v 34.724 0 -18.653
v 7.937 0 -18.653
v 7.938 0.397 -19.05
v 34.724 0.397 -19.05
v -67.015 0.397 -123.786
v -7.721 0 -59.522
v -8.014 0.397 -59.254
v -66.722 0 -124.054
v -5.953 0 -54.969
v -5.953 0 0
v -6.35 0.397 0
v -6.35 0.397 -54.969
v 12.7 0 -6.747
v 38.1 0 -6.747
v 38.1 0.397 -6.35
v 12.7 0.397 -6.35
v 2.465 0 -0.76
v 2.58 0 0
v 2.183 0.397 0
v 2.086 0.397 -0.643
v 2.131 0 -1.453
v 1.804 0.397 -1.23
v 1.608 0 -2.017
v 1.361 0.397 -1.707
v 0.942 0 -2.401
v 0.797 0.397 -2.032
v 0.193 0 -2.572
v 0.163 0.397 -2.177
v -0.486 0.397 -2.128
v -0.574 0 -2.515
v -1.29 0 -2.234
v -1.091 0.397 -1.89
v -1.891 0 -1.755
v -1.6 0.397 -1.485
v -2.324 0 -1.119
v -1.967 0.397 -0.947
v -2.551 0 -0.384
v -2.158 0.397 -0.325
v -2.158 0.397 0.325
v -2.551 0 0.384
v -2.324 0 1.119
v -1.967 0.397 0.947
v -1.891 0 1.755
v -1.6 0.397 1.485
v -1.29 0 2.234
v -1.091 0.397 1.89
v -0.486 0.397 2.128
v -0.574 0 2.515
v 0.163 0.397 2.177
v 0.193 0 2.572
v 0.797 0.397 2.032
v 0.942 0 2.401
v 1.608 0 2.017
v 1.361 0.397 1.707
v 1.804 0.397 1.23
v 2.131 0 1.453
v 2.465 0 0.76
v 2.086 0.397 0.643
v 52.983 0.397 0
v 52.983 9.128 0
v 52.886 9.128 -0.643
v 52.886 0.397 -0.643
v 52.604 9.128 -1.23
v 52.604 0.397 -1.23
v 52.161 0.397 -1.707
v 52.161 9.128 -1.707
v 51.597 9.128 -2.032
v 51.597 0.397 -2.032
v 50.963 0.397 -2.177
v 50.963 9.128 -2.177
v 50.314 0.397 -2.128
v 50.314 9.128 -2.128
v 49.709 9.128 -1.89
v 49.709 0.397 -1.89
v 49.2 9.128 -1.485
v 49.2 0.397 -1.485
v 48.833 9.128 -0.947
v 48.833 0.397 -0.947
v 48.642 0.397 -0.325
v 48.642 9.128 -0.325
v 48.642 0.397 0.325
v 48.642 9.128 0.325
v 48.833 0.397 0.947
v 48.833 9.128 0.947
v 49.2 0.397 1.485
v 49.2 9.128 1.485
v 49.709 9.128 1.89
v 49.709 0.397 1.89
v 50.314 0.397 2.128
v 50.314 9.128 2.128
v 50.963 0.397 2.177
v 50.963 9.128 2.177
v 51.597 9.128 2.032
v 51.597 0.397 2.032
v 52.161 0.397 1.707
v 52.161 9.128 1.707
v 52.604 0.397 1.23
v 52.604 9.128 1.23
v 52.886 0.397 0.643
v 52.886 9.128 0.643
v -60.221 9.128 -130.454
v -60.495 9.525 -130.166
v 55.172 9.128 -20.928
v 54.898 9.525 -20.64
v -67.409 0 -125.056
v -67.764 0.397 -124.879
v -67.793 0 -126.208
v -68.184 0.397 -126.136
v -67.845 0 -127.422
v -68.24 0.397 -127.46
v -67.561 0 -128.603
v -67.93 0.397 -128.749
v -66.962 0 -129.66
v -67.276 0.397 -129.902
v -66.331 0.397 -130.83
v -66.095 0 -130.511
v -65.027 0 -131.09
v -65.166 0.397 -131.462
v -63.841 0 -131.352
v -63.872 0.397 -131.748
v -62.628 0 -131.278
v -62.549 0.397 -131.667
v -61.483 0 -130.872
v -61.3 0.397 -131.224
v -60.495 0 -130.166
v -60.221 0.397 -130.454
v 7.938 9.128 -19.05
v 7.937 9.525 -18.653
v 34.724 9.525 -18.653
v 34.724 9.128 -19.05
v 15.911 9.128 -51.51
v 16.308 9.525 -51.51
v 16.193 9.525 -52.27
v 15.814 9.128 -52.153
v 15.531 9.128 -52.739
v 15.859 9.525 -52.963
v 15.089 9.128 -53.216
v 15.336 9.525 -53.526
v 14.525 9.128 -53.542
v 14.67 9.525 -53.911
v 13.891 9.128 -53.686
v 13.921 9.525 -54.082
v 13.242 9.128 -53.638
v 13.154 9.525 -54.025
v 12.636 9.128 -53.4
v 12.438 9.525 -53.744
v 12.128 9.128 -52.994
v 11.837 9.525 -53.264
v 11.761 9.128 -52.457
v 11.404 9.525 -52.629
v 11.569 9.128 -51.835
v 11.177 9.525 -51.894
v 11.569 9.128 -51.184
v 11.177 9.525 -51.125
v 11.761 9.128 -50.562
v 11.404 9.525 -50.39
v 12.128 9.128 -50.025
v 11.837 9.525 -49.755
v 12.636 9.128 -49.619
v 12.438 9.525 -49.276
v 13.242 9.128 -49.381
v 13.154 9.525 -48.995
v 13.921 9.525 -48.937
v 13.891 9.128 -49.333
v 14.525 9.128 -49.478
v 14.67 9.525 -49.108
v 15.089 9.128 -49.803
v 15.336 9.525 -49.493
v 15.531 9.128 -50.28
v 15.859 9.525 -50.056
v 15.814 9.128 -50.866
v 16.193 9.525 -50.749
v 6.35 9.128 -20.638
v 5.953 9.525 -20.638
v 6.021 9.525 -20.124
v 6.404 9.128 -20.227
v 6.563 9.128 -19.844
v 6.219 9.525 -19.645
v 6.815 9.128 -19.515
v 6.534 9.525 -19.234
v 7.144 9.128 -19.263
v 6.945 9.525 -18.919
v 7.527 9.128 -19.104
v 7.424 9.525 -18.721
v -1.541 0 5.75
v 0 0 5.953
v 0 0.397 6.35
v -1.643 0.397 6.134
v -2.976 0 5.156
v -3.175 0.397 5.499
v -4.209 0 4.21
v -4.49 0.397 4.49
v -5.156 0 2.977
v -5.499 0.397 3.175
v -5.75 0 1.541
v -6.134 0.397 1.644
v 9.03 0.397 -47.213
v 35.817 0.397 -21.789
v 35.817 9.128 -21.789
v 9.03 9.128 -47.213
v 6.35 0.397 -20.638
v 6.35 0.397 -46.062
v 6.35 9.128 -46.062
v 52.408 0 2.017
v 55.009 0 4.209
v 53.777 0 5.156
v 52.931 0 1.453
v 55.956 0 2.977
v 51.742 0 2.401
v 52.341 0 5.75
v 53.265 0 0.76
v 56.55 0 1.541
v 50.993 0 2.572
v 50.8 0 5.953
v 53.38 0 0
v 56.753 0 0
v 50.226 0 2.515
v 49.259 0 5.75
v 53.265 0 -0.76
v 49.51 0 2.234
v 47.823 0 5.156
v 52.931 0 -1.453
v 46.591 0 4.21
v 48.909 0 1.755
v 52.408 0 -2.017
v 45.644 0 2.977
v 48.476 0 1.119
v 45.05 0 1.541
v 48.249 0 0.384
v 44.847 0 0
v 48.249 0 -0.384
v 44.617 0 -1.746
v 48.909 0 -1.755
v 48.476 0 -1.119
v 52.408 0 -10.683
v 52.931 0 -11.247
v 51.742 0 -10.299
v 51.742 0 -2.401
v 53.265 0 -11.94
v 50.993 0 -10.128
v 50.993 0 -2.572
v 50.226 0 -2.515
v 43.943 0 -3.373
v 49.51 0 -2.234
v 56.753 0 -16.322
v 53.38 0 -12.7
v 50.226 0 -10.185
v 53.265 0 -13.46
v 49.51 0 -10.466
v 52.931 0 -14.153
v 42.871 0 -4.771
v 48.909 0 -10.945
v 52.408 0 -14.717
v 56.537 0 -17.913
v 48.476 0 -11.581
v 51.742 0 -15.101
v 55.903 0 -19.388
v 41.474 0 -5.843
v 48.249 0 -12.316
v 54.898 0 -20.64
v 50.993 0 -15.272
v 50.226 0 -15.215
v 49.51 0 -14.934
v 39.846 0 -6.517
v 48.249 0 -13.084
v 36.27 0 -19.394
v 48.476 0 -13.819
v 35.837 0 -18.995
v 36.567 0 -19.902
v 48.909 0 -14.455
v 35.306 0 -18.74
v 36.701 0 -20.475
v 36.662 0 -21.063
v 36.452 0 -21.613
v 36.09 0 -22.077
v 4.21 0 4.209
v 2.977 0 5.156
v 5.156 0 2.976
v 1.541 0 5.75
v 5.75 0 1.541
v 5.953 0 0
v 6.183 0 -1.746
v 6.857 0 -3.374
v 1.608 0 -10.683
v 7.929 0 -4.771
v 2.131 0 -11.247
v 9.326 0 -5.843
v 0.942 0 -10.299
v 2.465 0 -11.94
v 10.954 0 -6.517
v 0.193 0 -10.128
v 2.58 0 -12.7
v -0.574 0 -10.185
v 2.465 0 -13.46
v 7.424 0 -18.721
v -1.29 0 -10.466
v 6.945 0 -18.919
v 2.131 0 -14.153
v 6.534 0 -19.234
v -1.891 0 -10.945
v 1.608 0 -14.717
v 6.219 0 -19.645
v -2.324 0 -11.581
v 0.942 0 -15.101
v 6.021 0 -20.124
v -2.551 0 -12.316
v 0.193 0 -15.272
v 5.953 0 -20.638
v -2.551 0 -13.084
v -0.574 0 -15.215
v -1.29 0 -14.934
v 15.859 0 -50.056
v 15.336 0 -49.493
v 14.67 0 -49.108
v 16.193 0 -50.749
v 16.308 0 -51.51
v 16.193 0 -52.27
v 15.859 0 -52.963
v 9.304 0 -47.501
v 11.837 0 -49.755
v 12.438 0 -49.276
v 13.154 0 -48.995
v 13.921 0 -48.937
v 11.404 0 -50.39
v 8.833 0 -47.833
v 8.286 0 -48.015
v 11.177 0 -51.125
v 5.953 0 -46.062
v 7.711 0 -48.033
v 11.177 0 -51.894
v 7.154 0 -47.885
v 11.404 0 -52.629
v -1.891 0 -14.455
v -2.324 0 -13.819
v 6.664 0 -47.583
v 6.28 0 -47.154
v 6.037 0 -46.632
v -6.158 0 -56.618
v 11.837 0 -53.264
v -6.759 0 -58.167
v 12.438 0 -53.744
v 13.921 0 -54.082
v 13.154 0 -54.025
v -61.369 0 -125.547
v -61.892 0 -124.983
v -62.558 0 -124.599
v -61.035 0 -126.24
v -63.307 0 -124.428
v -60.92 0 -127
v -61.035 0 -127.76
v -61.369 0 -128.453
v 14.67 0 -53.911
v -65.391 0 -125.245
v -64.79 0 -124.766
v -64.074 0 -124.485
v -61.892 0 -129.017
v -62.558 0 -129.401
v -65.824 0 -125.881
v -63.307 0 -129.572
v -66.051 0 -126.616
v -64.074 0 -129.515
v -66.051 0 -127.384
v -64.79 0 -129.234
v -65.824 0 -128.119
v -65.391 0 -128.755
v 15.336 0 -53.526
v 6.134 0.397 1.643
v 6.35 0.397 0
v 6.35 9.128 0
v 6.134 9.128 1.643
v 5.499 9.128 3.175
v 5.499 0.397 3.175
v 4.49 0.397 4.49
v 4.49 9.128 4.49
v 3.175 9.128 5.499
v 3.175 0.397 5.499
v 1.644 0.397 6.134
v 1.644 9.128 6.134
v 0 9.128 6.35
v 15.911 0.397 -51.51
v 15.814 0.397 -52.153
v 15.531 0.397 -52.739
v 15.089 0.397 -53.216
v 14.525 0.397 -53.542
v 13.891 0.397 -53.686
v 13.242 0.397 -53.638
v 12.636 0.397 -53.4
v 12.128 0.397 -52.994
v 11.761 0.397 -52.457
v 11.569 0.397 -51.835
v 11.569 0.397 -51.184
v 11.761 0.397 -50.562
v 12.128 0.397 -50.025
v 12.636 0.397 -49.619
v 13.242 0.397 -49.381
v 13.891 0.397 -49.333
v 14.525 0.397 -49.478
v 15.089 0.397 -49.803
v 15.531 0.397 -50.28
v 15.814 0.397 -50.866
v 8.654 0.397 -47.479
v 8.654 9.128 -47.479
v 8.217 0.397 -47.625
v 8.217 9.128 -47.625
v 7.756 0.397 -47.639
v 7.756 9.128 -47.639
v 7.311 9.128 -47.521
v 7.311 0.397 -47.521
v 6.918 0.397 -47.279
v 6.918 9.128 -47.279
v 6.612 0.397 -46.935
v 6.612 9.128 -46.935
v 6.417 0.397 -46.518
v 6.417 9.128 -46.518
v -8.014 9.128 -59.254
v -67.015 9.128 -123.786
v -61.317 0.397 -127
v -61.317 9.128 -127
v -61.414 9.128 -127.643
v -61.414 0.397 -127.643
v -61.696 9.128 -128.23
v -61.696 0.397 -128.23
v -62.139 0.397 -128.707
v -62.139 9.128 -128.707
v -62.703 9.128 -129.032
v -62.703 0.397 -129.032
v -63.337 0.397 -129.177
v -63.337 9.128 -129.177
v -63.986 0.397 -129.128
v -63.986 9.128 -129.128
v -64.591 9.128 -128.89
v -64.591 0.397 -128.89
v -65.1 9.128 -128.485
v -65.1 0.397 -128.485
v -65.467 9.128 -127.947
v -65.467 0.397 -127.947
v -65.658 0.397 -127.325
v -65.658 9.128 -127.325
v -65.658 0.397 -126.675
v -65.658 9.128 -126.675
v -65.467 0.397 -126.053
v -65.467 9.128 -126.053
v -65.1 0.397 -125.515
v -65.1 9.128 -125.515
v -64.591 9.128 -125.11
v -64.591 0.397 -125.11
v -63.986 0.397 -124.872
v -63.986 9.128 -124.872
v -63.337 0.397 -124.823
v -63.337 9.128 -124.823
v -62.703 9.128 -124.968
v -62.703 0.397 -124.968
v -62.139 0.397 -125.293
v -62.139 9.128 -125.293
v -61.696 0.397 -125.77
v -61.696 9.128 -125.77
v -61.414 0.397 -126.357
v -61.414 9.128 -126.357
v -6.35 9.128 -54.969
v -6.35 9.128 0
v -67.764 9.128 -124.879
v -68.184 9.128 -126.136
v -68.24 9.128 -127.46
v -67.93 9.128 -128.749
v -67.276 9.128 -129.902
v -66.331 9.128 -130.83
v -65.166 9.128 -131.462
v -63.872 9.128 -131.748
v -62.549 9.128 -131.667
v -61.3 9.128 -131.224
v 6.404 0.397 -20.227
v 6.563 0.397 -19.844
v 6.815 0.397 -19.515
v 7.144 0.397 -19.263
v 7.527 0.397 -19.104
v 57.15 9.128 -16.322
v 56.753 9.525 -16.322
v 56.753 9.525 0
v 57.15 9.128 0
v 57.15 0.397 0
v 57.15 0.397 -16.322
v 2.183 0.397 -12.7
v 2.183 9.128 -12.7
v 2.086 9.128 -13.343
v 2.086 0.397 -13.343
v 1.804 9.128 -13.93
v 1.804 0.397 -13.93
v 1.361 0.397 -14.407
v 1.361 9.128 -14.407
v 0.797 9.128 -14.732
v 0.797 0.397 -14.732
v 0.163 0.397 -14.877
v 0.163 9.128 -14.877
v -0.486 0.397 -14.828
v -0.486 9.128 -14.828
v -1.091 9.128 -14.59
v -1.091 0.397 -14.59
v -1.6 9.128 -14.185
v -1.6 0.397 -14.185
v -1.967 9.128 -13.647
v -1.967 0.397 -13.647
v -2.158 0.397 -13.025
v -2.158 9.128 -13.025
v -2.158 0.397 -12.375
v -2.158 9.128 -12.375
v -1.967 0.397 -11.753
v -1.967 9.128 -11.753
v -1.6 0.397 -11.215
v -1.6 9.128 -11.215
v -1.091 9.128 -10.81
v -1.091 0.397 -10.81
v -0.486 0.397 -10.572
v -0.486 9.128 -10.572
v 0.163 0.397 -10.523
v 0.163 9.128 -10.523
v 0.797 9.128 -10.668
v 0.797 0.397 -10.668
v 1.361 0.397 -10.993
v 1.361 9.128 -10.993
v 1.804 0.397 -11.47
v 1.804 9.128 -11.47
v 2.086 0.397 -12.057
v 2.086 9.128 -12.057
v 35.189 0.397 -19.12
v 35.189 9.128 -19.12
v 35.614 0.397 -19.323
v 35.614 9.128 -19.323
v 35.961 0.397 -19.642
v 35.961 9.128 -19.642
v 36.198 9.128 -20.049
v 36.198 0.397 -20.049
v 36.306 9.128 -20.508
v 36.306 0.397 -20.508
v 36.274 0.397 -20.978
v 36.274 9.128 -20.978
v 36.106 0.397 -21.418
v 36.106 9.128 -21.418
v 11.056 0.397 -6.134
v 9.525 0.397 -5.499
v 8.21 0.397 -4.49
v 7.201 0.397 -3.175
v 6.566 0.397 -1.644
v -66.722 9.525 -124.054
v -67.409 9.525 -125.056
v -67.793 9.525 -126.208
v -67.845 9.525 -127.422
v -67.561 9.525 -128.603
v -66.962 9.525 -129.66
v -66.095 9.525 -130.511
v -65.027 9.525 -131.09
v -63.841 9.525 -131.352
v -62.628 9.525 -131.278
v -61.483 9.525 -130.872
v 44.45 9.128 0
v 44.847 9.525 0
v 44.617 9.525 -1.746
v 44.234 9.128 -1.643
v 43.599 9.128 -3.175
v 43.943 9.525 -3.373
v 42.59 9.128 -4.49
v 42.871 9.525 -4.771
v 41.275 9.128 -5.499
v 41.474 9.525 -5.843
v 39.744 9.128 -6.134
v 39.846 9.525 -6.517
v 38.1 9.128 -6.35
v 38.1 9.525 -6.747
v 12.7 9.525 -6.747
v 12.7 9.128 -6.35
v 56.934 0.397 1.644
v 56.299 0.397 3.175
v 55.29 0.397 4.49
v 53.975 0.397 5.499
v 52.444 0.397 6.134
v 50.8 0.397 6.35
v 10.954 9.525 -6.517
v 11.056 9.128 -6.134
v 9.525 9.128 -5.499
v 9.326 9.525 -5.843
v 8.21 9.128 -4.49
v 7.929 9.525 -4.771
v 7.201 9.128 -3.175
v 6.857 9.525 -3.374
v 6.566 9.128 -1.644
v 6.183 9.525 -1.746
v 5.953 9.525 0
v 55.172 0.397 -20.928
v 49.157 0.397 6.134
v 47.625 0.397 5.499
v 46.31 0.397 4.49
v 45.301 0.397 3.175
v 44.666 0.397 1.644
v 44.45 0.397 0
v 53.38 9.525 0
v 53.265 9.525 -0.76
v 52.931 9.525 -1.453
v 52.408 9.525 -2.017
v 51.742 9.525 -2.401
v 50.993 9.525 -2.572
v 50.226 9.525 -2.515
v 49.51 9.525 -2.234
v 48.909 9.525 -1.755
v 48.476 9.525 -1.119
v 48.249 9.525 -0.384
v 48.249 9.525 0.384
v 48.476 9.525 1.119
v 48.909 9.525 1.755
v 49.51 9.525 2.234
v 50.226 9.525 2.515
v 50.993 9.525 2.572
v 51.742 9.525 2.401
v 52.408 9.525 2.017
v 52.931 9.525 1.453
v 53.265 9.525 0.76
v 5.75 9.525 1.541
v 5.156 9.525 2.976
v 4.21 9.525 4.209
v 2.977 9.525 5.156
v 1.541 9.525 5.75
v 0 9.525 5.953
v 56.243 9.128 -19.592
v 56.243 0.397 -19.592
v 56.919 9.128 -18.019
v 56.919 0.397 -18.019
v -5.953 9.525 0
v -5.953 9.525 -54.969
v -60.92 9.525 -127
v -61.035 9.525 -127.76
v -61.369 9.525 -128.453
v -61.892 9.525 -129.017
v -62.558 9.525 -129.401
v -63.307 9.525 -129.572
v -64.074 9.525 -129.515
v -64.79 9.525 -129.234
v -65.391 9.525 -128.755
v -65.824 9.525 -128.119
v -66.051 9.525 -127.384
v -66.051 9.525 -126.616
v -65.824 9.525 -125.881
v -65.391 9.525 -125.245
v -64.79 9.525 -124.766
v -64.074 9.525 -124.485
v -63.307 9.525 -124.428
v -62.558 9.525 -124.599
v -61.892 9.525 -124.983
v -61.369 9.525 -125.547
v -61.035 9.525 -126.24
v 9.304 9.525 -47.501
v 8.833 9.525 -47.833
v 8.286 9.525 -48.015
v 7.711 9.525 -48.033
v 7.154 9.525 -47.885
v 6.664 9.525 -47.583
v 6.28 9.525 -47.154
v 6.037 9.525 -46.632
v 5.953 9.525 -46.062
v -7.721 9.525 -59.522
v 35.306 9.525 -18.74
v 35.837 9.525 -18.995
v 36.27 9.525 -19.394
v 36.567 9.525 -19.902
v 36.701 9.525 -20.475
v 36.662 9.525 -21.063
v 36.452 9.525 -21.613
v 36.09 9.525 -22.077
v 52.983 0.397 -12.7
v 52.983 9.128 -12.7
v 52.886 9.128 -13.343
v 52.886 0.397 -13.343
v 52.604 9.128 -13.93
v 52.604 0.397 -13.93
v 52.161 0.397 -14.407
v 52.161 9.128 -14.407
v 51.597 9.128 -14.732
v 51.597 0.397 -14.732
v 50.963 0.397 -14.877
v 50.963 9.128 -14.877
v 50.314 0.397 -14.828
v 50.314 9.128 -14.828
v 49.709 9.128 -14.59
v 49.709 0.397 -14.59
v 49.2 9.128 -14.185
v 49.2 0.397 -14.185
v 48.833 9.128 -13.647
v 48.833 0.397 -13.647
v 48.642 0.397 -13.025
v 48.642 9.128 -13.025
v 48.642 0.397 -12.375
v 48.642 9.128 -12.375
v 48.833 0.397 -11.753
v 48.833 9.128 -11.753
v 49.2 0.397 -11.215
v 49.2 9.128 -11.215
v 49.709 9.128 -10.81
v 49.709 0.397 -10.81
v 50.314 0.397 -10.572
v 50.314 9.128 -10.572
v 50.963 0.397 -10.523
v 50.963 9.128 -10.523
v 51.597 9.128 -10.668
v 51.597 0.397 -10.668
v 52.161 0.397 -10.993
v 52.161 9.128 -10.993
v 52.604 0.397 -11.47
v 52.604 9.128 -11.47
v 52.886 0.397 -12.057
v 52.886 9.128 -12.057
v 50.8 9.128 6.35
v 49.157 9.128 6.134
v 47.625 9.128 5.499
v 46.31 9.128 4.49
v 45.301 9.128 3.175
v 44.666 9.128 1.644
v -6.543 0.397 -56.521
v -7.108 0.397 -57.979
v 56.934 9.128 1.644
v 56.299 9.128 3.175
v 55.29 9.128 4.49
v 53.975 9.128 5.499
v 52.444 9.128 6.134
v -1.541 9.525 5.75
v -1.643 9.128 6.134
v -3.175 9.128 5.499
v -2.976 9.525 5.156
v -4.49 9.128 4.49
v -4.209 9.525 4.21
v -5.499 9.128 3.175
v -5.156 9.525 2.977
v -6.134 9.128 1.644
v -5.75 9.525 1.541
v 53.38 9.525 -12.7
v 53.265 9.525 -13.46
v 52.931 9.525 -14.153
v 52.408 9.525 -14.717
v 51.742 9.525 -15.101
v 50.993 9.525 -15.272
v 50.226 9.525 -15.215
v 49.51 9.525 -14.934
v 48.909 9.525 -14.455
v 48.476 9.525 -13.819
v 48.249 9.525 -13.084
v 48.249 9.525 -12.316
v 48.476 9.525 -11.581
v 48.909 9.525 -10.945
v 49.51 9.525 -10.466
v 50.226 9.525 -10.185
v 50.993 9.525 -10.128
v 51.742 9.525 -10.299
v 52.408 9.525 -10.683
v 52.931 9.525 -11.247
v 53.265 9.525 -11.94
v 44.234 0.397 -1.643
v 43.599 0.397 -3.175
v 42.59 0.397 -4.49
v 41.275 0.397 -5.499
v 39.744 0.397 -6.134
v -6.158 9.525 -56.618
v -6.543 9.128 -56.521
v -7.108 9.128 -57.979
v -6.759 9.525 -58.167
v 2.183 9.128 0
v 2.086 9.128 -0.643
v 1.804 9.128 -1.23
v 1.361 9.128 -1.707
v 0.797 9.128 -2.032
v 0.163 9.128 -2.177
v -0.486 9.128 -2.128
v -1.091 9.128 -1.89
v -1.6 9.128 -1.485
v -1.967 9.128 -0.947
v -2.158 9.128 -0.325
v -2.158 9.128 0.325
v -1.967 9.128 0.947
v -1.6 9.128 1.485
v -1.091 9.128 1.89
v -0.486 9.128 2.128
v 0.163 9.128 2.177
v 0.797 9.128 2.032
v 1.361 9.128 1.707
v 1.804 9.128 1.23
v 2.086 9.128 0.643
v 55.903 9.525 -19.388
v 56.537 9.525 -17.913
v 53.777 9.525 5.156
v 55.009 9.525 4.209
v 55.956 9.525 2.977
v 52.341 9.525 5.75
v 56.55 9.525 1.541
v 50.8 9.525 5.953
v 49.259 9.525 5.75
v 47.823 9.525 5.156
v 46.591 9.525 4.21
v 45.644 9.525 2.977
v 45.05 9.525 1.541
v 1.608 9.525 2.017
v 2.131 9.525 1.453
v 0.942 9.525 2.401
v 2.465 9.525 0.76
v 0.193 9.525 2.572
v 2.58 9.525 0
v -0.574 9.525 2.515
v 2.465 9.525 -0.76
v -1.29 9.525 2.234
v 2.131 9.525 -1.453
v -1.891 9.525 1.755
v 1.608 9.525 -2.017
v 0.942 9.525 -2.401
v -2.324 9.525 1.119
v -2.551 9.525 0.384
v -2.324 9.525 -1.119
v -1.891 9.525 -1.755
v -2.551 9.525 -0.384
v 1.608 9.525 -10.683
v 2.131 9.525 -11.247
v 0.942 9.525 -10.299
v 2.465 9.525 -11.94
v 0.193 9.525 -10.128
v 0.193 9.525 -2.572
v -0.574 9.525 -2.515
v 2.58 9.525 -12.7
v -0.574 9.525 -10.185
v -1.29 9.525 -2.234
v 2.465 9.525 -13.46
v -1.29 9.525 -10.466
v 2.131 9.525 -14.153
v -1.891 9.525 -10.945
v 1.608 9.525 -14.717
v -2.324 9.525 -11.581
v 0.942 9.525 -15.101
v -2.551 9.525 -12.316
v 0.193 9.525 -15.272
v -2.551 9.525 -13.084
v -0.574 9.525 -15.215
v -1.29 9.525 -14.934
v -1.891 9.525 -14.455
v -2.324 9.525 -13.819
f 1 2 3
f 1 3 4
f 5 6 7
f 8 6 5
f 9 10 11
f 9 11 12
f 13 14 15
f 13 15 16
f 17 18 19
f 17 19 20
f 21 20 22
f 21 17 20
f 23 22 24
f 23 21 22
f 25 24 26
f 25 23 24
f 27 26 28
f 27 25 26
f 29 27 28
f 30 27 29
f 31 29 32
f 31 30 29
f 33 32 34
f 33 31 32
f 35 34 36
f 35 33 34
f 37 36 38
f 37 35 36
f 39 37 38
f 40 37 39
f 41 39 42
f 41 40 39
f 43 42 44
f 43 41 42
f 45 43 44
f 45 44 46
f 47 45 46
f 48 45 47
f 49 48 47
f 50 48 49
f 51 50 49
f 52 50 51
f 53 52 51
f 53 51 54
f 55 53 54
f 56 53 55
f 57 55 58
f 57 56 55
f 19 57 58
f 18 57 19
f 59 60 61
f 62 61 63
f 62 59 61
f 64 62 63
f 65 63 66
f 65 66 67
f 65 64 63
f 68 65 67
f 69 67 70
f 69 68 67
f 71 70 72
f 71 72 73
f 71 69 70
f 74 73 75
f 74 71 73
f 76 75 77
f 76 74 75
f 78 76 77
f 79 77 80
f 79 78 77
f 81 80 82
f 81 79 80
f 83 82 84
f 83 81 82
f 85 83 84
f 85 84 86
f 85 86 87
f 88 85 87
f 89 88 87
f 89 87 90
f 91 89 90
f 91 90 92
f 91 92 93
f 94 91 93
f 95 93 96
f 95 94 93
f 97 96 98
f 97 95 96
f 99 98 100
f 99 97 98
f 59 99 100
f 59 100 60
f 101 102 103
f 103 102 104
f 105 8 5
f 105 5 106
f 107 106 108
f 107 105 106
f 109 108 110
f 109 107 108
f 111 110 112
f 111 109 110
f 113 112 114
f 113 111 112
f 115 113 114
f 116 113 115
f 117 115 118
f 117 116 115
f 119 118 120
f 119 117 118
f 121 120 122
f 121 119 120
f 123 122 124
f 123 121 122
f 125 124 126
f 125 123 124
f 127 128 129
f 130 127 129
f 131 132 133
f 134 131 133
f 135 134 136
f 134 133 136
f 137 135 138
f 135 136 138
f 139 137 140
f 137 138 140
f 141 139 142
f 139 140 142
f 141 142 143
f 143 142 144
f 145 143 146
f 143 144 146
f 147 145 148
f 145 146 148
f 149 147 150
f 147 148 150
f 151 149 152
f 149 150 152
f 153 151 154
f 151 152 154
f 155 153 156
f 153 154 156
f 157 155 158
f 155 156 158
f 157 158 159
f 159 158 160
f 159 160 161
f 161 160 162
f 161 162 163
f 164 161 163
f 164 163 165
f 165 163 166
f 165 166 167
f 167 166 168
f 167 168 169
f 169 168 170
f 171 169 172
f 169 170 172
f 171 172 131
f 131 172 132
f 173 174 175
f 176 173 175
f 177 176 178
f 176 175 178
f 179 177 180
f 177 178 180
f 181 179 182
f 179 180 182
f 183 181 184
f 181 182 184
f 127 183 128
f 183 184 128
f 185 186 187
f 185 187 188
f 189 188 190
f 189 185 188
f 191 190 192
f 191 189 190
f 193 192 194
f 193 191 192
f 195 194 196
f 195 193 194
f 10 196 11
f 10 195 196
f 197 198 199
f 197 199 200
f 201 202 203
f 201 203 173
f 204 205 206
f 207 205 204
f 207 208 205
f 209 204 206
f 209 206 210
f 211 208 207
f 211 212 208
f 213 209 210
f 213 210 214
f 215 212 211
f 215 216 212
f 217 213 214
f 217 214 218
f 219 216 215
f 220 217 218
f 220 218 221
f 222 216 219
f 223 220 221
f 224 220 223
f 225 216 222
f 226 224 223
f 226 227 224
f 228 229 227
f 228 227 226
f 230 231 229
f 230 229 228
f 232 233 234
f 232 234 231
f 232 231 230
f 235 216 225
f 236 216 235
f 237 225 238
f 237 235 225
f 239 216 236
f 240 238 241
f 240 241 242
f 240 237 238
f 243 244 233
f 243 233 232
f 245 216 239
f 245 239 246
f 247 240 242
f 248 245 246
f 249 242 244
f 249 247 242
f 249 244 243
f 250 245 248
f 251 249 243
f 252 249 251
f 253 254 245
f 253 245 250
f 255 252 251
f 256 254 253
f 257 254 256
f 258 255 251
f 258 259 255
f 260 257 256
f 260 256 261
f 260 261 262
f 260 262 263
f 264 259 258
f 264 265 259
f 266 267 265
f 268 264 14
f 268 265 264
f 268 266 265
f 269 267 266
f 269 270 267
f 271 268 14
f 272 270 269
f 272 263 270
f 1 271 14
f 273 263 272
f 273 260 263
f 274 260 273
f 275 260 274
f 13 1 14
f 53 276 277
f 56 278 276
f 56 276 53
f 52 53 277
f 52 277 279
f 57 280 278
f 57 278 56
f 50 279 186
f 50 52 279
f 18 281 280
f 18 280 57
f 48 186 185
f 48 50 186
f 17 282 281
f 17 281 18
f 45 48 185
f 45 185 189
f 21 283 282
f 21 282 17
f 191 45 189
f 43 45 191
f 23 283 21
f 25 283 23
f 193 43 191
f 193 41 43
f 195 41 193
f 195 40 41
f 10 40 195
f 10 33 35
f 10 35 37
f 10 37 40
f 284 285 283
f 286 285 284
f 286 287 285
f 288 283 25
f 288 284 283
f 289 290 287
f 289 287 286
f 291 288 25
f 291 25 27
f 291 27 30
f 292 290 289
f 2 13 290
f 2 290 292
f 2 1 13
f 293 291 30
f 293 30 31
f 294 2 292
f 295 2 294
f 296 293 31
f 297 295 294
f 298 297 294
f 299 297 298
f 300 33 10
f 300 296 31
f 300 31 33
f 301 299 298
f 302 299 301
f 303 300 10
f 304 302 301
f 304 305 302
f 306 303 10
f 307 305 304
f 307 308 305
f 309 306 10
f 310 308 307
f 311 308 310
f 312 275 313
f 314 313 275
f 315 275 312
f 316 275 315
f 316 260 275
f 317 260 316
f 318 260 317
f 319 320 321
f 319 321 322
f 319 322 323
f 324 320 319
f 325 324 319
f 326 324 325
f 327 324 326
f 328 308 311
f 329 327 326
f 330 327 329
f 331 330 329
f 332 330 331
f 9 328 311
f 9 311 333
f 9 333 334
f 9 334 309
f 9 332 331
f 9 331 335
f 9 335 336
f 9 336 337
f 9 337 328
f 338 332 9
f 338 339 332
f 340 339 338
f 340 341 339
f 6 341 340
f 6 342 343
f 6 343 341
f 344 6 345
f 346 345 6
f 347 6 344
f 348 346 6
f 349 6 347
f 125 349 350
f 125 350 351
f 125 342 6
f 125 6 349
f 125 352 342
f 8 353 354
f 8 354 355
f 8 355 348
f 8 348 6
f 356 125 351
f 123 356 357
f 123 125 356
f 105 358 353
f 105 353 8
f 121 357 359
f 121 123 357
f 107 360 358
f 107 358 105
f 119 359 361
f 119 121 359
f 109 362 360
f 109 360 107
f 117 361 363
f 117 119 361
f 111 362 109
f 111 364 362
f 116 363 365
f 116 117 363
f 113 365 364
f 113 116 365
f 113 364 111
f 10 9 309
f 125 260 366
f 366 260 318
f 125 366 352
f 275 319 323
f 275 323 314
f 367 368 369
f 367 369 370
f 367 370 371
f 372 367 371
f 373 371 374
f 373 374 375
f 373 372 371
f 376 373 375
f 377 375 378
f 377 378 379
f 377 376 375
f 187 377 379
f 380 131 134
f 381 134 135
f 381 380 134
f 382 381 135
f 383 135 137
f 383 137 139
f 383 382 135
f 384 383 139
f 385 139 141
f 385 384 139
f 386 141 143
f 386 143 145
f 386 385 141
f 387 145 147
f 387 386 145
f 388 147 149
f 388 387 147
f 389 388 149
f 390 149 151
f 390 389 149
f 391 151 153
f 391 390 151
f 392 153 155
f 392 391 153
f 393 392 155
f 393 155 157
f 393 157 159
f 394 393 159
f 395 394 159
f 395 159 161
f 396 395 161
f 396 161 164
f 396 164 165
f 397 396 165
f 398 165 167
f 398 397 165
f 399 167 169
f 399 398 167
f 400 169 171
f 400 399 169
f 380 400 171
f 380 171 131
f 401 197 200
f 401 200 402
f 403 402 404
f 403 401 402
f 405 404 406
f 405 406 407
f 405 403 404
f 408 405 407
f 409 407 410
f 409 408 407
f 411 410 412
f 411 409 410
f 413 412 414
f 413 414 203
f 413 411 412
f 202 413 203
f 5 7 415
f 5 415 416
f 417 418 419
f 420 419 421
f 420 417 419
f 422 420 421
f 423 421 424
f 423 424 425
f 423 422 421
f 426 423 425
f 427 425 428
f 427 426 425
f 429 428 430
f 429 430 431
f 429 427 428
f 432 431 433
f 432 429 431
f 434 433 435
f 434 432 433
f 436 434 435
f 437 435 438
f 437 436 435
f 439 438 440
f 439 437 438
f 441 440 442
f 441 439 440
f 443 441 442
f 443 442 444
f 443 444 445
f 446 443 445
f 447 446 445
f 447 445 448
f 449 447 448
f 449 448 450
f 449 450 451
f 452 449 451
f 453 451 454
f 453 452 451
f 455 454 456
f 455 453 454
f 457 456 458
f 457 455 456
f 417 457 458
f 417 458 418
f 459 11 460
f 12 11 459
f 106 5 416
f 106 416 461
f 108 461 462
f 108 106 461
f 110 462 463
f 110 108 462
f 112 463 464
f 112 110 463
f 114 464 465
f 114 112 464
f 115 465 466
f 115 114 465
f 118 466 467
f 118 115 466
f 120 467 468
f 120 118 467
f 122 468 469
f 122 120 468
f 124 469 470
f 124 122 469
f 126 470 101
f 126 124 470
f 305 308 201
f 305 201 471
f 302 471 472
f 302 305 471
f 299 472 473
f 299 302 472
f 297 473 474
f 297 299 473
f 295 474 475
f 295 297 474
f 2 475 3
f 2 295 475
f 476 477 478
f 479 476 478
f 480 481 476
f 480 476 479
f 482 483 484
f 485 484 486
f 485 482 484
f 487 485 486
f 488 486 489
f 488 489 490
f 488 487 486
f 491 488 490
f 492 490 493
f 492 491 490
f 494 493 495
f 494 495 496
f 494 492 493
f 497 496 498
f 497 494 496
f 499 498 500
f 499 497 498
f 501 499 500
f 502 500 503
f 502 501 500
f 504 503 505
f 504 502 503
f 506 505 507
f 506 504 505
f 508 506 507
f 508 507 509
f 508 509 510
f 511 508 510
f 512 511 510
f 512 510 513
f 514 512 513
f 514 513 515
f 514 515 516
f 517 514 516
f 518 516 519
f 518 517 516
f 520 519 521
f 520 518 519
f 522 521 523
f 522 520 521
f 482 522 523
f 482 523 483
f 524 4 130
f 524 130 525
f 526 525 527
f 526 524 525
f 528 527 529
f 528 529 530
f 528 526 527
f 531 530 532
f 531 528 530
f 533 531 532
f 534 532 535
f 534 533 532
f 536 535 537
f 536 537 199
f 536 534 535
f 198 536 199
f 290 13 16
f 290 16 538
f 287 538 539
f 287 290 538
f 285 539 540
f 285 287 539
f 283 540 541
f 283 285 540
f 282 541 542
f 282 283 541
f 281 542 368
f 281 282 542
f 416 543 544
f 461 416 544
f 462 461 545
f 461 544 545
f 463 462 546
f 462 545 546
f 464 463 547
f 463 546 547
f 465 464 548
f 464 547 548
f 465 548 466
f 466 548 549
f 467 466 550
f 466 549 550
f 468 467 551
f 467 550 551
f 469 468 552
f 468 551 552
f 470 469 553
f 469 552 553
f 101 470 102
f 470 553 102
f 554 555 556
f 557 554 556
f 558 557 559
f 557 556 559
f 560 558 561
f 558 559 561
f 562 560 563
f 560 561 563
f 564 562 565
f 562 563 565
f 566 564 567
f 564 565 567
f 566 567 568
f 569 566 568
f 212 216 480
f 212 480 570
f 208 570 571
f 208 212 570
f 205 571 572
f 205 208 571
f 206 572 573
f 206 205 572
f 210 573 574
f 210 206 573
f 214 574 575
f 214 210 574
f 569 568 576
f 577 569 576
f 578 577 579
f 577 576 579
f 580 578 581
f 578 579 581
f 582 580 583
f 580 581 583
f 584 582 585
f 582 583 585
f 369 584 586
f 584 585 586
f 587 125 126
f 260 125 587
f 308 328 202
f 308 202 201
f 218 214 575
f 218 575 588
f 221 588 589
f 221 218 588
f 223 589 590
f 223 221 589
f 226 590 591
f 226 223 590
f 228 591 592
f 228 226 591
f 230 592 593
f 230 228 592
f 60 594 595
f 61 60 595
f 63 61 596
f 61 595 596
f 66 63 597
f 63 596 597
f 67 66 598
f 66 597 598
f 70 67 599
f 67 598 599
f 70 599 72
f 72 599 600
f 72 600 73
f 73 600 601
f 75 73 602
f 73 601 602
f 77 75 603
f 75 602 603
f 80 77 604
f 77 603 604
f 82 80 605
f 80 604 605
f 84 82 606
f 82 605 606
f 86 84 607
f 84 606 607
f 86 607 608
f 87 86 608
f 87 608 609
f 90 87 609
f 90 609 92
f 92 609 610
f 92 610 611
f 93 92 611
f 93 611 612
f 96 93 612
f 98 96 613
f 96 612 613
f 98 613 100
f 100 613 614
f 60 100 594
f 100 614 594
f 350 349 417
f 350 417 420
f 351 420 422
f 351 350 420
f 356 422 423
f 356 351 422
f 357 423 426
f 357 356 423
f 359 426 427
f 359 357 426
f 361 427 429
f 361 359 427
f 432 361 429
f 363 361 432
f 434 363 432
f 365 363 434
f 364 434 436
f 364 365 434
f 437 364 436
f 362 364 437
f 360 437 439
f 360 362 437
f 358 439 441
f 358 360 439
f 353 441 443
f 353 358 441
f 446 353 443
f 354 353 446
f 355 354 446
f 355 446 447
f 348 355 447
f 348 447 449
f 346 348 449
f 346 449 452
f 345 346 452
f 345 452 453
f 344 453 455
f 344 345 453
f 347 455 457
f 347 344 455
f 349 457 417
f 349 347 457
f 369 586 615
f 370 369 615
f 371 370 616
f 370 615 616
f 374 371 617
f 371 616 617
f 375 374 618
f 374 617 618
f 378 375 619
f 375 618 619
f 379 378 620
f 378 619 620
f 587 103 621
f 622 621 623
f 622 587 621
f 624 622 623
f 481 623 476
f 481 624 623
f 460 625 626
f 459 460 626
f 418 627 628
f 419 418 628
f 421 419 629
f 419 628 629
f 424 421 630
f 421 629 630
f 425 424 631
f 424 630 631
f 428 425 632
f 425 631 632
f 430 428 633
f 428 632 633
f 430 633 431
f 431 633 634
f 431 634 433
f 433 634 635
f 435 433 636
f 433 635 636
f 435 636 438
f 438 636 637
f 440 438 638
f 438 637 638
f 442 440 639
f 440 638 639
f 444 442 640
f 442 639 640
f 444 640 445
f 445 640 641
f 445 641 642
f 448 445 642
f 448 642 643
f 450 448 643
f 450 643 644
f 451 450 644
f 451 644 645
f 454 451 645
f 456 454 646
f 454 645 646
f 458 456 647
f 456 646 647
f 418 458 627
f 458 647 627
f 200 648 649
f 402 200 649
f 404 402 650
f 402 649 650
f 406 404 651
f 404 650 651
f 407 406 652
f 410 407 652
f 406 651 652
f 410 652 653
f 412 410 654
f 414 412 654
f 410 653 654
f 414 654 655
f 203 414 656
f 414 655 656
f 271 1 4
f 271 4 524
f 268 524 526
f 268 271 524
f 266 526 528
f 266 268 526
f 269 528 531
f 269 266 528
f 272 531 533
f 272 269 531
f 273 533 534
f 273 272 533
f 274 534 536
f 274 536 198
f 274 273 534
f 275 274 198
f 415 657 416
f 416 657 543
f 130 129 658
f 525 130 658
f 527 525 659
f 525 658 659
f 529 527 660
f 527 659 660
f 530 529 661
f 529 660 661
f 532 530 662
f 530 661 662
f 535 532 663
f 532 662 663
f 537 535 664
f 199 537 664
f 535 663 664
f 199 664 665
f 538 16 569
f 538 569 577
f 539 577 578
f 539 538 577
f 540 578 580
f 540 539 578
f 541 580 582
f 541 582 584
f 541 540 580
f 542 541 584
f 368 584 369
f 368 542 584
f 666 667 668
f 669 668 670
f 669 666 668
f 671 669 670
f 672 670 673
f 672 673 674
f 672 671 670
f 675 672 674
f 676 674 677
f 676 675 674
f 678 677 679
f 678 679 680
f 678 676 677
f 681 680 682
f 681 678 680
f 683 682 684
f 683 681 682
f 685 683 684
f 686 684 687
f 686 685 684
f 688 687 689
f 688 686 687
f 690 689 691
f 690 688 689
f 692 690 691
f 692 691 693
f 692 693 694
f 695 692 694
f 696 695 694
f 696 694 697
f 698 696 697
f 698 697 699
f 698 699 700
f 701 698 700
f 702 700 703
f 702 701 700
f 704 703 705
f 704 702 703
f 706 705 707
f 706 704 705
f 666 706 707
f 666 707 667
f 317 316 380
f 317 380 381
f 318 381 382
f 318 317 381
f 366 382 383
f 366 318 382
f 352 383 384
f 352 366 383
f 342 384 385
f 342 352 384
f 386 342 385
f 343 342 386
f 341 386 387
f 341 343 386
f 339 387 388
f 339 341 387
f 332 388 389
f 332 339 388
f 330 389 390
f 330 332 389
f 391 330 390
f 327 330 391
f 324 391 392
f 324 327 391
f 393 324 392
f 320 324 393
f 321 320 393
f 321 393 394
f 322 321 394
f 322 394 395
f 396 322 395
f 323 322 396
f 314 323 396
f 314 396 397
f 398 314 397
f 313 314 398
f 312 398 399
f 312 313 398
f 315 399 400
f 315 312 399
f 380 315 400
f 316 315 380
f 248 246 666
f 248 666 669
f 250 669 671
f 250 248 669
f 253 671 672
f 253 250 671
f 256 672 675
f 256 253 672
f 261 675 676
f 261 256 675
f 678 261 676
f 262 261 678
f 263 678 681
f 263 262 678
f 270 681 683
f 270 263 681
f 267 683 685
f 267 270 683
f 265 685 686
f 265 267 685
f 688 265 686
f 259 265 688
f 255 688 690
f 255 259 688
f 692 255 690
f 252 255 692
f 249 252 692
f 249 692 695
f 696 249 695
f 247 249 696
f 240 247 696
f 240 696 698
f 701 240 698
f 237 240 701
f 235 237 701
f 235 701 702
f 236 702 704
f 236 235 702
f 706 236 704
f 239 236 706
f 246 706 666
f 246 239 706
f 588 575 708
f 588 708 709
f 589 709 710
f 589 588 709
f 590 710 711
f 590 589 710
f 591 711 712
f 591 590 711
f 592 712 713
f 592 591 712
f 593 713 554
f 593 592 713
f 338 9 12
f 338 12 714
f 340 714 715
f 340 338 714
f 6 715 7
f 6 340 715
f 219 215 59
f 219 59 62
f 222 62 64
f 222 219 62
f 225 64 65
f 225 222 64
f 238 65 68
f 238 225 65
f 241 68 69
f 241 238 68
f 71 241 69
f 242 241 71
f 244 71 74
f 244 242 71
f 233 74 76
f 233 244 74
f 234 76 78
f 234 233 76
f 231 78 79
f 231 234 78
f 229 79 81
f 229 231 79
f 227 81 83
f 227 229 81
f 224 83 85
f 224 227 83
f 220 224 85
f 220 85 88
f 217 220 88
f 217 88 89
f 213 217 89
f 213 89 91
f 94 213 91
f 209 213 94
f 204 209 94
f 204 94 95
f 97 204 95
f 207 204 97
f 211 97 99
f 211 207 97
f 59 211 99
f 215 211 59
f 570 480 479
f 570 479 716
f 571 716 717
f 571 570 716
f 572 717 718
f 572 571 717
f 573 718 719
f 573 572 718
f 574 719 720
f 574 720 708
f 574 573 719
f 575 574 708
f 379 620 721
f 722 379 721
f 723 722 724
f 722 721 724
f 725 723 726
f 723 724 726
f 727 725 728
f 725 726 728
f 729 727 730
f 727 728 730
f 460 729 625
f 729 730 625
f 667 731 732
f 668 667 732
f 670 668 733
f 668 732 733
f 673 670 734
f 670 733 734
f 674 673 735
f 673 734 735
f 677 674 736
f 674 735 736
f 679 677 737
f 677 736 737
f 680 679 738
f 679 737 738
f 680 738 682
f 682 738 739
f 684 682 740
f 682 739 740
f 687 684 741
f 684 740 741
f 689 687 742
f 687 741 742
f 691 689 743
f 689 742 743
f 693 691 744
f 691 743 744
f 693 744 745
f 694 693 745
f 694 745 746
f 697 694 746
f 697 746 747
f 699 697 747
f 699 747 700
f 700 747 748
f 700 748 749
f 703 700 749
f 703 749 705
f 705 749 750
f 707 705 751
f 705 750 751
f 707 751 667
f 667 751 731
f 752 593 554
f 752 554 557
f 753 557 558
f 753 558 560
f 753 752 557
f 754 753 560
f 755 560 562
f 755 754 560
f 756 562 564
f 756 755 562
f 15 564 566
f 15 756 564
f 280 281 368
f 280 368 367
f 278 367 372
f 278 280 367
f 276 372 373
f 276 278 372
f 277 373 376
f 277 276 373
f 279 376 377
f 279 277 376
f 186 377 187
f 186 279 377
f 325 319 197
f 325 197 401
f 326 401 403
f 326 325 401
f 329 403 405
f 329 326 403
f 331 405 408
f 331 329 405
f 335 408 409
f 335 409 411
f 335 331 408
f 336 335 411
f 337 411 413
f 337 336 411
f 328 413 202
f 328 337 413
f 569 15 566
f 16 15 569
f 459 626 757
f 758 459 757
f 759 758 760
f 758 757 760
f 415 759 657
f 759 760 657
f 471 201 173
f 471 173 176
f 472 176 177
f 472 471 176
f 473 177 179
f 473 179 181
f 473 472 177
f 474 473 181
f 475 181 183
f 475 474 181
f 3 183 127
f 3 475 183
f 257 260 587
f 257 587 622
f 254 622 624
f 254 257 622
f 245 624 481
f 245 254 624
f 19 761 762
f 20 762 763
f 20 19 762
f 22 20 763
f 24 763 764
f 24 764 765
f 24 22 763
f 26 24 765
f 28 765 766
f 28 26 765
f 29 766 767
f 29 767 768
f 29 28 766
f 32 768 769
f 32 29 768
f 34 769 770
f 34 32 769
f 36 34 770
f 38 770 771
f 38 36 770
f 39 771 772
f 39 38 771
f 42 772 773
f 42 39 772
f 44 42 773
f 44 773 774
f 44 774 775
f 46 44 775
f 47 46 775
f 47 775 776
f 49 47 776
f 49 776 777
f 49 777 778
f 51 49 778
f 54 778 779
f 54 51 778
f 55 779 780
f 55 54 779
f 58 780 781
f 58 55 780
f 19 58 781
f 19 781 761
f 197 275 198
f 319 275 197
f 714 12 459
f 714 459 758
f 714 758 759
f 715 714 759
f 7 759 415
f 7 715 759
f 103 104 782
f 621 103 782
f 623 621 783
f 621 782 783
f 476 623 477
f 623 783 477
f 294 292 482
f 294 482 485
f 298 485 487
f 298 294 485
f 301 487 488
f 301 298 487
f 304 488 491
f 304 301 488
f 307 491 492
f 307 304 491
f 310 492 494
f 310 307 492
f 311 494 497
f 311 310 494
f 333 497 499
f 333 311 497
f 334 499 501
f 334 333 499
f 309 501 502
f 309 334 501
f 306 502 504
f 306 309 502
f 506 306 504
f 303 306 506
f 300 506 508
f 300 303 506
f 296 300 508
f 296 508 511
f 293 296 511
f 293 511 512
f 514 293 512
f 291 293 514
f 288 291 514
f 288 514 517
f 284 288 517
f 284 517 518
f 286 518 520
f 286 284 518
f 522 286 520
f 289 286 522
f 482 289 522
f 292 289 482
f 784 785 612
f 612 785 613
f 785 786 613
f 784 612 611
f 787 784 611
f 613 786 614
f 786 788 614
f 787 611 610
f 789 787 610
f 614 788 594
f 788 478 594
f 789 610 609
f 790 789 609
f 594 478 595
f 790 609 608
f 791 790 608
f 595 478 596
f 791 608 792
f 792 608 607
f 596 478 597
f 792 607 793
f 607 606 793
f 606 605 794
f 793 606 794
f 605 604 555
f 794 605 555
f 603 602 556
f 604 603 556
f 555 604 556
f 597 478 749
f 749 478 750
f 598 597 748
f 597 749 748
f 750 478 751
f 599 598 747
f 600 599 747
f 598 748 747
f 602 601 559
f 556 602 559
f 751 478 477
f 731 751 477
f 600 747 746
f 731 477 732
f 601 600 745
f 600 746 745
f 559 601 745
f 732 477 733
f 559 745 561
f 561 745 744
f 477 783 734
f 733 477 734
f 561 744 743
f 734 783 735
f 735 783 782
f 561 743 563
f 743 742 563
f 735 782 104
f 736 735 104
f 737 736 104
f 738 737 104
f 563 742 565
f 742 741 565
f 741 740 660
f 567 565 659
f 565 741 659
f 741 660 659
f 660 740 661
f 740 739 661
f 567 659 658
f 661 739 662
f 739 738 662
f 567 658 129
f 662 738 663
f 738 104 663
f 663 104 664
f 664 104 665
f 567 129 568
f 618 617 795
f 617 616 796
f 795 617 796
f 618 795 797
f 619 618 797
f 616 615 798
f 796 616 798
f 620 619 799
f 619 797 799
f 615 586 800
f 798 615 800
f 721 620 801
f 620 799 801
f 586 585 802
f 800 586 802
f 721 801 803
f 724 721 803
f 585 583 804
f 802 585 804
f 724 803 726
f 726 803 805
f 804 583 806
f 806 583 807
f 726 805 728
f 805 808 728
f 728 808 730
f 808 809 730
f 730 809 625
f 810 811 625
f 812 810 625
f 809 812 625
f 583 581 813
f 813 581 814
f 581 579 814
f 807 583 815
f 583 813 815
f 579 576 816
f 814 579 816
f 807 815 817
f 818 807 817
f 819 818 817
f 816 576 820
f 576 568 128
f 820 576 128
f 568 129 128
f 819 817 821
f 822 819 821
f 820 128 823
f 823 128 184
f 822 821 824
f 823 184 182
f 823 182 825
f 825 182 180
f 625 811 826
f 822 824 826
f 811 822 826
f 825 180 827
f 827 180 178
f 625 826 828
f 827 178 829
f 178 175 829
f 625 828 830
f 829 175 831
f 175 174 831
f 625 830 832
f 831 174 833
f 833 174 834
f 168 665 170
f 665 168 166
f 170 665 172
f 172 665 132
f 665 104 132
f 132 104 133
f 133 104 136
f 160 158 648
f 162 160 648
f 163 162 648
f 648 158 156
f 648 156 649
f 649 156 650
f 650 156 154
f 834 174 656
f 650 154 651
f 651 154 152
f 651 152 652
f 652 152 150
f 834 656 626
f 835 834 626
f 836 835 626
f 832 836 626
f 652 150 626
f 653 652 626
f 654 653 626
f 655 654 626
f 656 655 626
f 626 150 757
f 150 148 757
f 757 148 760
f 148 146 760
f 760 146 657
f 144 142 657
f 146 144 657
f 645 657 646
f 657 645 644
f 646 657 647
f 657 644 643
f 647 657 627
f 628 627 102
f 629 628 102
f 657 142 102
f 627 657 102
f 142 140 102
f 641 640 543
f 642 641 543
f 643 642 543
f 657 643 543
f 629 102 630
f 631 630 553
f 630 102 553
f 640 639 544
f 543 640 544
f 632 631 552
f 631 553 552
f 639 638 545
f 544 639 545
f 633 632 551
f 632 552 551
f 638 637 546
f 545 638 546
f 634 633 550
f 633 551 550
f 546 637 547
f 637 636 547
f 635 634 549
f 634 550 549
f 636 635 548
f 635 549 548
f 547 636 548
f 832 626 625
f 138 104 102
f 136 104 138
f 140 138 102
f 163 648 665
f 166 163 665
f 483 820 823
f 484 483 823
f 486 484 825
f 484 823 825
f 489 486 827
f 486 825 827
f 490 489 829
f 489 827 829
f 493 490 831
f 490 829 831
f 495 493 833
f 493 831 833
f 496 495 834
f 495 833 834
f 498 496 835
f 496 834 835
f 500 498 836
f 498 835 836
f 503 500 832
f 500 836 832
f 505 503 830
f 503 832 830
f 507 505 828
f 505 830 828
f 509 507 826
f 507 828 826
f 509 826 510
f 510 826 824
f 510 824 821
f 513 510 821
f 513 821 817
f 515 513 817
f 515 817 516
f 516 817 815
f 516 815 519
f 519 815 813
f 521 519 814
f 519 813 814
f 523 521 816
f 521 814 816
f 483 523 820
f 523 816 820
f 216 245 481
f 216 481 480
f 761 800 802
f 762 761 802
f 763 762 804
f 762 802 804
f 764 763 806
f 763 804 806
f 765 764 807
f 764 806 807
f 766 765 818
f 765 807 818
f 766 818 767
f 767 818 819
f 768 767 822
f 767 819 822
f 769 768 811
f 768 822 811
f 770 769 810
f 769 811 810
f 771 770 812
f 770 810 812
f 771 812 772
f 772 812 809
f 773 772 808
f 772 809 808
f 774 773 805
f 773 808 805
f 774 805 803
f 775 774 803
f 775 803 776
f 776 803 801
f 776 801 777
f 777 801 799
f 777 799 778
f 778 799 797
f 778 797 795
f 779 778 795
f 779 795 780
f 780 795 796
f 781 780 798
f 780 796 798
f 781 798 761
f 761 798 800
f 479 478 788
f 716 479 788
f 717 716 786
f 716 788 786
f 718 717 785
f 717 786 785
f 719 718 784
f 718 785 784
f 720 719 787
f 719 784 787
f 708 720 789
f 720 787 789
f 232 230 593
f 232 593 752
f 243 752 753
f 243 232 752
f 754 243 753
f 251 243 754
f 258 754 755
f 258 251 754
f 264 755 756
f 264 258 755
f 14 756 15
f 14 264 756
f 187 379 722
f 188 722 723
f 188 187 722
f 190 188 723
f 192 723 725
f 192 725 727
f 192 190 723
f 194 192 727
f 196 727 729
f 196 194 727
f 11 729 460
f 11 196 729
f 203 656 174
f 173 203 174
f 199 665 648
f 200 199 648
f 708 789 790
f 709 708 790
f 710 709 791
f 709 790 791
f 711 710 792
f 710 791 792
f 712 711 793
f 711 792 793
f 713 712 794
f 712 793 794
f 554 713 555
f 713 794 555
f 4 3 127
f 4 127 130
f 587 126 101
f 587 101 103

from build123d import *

# Parameters (mm, degrees)
SKETCH1_R           = 2.1828125
BOSS_EXTRUDE1_DEPTH = 9.525
CHAMFER1_SIZE       = 0.396875


with BuildPart() as part:
    # Sketch1 → Boss-Extrude1 (new body)
    with BuildSketch(Plane(origin=(0, 0, 0), x_dir=(1, 0, 0), z_dir=(0, 1, 0))):
        with BuildLine():
            Line((-6.35, 0), (-6.35, 54.968986339))
            ThreePointArc((-6.35, 54.968986339), (-6.780470884, 57.267175854), (-8.013519701, 59.253773662))
            Line((-8.013519701, 59.253773662), (-67.014860224, 123.786409508))
            ThreePointArc((-67.014860224, 123.786409508), (-66.836015353, 130.398883319), (-60.221355188, 130.454257437))
            Line((-60.221355188, 130.454257437), (55.171526417, 20.927889031))
            ThreePointArc((55.171526417, 20.927889031), (56.634453391, 18.828535178), (57.15, 16.322212447))
            Line((57.15, 16.322212447), (57.15, 0))
            ThreePointArc((57.15, 0), (55.290128061, -4.490128061), (50.8, -6.35))
            ThreePointArc((50.8, -6.35), (46.309797545, -4.490202455), (44.45, -0.000254))
            ThreePointArc((44.45, -0.000254), (42.590202455, 4.490202455), (38.100254, 6.35))
            Line((38.100254, 6.35), (12.699746, 6.35))
            ThreePointArc((12.699746, 6.35), (8.209797545, 4.490202455), (6.35, 0.000254))
            ThreePointArc((6.35, 0.000254), (4.490202455, -4.490202455), (0.000254, -6.35))
            ThreePointArc((0.000254, -6.35), (-4.490128061, -4.490128061), (-6.35, 0))
        make_face()
        Circle(SKETCH1_R, mode=Mode.SUBTRACT)
        with Locations((50.8, 12.7)):
            Circle(SKETCH1_R, mode=Mode.SUBTRACT)
        with Locations((-63.5, 127)):
            Circle(SKETCH1_R, mode=Mode.SUBTRACT)
        with Locations((0, 12.7)):
            Circle(SKETCH1_R, mode=Mode.SUBTRACT)
        with Locations((50.8, 0)):
            Circle(SKETCH1_R, mode=Mode.SUBTRACT)
        with Locations((13.727904726, 51.509581964)):
            Circle(SKETCH1_R, mode=Mode.SUBTRACT)
        with BuildLine():
            Line((35.81658762, 21.788919146), (9.030381604, 47.213328586))
            ThreePointArc((9.030381604, 47.213328586), (7.310919317, 47.520522788), (6.35, 46.06190944))
            Line((6.35, 46.06190944), (6.35, 20.6375))
            ThreePointArc((6.35, 20.6375), (6.814967985, 19.514967985), (7.9375, 19.05))
            Line((7.9375, 19.05), (34.723706016, 19.05))
            ThreePointArc((34.723706016, 19.05), (36.198160855, 20.04916406), (35.81658762, 21.788919146))
        make_face(mode=Mode.SUBTRACT)
    extrude(amount=BOSS_EXTRUDE1_DEPTH)

    # Chamfer1
    chamfer1_edges = [part.edges().sort_by_distance(p)[0] for p in [
        (56.634453391, 9.525, -18.828535178),
        (-2.524914386, 9.525, -75.691073234),
        (46.309887349, 0, 4.490292258),
        (46.309887349, 0, 4.490292258),
        (42.59038206, 0, -4.490022844),
        (42.59038206, 0, -4.490022844),
        (25.4, 0, -6.35),
        (8.209797545, 0, -4.490202455),
        (4.49038206, 0, 4.490022844),
        (4.49038206, 0, 4.490022844),
        (-4.490038256, 0, 4.490217863),
        (-66.836015353, 9.525, -130.398883319),
        (-4.490038256, 0, 4.490217863),
        (-6.35, 0, -27.484493169),
        (-6.780470884, 0, -57.267175854),
        (-37.514189963, 0, -91.520091585),
        (-66.836015353, 0, -130.398883319),
        (-2.524914386, 0, -75.691073234),
        (56.634453391, 0, -18.828535178),
        (57.15, 0, -8.161106224),
        (55.290128061, 0, 4.490128061),
        (-37.514189963, 9.525, -91.520091585),
        (-6.780470884, 9.525, -57.267175854),
        (-6.35, 9.525, -27.484493169),
        (-4.490038256, 9.525, 4.490217863),
        (-4.490038256, 9.525, 4.490217863),
        (-2.1828125, 0, 0),
        (4.49038206, 9.525, 4.490022844),
        (-2.1828125, 9.525, 0),
        (48.6171875, 0, -12.7),
        (48.6171875, 9.525, -12.7),
        (4.49038206, 9.525, 4.490022844),
        (55.290128061, 9.525, 4.490128061),
        (-65.6828125, 0, -127),
        (-65.6828125, 9.525, -127),
        (8.209797545, 9.525, -4.490202455),
        (-2.1828125, 0, -12.7),
        (-2.1828125, 9.525, -12.7),
        (25.4, 9.525, -6.35),
        (48.6171875, 0, 0),
        (48.6171875, 9.525, 0),
        (42.59038206, 9.525, -4.490022844),
        (42.59038206, 9.525, -4.490022844),
        (36.198160855, 0, -20.04916406),
        (22.423484612, 0, -34.501123866),
        (7.310919317, 0, -47.520522788),
        (46.309887349, 9.525, 4.490292258),
        (6.35, 0, -33.34970472),
        (6.814967985, 0, -19.514967985),
        (21.330603008, 0, -19.05),
        (36.198160855, 9.525, -20.04916406),
        (22.423484612, 9.525, -34.501123866),
        (7.310919317, 9.525, -47.520522788),
        (6.35, 9.525, -33.34970472),
        (6.814967985, 9.525, -19.514967985),
        (21.330603008, 9.525, -19.05),
        (46.309887349, 9.525, 4.490292258),
        (11.545092226, 0, -51.509581964),
        (11.545092226, 9.525, -51.509581964),
        (57.15, 9.525, -8.161106224),
    ]]
    chamfer(chamfer1_edges, length=CHAMFER1_SIZE)


solid = part.part
